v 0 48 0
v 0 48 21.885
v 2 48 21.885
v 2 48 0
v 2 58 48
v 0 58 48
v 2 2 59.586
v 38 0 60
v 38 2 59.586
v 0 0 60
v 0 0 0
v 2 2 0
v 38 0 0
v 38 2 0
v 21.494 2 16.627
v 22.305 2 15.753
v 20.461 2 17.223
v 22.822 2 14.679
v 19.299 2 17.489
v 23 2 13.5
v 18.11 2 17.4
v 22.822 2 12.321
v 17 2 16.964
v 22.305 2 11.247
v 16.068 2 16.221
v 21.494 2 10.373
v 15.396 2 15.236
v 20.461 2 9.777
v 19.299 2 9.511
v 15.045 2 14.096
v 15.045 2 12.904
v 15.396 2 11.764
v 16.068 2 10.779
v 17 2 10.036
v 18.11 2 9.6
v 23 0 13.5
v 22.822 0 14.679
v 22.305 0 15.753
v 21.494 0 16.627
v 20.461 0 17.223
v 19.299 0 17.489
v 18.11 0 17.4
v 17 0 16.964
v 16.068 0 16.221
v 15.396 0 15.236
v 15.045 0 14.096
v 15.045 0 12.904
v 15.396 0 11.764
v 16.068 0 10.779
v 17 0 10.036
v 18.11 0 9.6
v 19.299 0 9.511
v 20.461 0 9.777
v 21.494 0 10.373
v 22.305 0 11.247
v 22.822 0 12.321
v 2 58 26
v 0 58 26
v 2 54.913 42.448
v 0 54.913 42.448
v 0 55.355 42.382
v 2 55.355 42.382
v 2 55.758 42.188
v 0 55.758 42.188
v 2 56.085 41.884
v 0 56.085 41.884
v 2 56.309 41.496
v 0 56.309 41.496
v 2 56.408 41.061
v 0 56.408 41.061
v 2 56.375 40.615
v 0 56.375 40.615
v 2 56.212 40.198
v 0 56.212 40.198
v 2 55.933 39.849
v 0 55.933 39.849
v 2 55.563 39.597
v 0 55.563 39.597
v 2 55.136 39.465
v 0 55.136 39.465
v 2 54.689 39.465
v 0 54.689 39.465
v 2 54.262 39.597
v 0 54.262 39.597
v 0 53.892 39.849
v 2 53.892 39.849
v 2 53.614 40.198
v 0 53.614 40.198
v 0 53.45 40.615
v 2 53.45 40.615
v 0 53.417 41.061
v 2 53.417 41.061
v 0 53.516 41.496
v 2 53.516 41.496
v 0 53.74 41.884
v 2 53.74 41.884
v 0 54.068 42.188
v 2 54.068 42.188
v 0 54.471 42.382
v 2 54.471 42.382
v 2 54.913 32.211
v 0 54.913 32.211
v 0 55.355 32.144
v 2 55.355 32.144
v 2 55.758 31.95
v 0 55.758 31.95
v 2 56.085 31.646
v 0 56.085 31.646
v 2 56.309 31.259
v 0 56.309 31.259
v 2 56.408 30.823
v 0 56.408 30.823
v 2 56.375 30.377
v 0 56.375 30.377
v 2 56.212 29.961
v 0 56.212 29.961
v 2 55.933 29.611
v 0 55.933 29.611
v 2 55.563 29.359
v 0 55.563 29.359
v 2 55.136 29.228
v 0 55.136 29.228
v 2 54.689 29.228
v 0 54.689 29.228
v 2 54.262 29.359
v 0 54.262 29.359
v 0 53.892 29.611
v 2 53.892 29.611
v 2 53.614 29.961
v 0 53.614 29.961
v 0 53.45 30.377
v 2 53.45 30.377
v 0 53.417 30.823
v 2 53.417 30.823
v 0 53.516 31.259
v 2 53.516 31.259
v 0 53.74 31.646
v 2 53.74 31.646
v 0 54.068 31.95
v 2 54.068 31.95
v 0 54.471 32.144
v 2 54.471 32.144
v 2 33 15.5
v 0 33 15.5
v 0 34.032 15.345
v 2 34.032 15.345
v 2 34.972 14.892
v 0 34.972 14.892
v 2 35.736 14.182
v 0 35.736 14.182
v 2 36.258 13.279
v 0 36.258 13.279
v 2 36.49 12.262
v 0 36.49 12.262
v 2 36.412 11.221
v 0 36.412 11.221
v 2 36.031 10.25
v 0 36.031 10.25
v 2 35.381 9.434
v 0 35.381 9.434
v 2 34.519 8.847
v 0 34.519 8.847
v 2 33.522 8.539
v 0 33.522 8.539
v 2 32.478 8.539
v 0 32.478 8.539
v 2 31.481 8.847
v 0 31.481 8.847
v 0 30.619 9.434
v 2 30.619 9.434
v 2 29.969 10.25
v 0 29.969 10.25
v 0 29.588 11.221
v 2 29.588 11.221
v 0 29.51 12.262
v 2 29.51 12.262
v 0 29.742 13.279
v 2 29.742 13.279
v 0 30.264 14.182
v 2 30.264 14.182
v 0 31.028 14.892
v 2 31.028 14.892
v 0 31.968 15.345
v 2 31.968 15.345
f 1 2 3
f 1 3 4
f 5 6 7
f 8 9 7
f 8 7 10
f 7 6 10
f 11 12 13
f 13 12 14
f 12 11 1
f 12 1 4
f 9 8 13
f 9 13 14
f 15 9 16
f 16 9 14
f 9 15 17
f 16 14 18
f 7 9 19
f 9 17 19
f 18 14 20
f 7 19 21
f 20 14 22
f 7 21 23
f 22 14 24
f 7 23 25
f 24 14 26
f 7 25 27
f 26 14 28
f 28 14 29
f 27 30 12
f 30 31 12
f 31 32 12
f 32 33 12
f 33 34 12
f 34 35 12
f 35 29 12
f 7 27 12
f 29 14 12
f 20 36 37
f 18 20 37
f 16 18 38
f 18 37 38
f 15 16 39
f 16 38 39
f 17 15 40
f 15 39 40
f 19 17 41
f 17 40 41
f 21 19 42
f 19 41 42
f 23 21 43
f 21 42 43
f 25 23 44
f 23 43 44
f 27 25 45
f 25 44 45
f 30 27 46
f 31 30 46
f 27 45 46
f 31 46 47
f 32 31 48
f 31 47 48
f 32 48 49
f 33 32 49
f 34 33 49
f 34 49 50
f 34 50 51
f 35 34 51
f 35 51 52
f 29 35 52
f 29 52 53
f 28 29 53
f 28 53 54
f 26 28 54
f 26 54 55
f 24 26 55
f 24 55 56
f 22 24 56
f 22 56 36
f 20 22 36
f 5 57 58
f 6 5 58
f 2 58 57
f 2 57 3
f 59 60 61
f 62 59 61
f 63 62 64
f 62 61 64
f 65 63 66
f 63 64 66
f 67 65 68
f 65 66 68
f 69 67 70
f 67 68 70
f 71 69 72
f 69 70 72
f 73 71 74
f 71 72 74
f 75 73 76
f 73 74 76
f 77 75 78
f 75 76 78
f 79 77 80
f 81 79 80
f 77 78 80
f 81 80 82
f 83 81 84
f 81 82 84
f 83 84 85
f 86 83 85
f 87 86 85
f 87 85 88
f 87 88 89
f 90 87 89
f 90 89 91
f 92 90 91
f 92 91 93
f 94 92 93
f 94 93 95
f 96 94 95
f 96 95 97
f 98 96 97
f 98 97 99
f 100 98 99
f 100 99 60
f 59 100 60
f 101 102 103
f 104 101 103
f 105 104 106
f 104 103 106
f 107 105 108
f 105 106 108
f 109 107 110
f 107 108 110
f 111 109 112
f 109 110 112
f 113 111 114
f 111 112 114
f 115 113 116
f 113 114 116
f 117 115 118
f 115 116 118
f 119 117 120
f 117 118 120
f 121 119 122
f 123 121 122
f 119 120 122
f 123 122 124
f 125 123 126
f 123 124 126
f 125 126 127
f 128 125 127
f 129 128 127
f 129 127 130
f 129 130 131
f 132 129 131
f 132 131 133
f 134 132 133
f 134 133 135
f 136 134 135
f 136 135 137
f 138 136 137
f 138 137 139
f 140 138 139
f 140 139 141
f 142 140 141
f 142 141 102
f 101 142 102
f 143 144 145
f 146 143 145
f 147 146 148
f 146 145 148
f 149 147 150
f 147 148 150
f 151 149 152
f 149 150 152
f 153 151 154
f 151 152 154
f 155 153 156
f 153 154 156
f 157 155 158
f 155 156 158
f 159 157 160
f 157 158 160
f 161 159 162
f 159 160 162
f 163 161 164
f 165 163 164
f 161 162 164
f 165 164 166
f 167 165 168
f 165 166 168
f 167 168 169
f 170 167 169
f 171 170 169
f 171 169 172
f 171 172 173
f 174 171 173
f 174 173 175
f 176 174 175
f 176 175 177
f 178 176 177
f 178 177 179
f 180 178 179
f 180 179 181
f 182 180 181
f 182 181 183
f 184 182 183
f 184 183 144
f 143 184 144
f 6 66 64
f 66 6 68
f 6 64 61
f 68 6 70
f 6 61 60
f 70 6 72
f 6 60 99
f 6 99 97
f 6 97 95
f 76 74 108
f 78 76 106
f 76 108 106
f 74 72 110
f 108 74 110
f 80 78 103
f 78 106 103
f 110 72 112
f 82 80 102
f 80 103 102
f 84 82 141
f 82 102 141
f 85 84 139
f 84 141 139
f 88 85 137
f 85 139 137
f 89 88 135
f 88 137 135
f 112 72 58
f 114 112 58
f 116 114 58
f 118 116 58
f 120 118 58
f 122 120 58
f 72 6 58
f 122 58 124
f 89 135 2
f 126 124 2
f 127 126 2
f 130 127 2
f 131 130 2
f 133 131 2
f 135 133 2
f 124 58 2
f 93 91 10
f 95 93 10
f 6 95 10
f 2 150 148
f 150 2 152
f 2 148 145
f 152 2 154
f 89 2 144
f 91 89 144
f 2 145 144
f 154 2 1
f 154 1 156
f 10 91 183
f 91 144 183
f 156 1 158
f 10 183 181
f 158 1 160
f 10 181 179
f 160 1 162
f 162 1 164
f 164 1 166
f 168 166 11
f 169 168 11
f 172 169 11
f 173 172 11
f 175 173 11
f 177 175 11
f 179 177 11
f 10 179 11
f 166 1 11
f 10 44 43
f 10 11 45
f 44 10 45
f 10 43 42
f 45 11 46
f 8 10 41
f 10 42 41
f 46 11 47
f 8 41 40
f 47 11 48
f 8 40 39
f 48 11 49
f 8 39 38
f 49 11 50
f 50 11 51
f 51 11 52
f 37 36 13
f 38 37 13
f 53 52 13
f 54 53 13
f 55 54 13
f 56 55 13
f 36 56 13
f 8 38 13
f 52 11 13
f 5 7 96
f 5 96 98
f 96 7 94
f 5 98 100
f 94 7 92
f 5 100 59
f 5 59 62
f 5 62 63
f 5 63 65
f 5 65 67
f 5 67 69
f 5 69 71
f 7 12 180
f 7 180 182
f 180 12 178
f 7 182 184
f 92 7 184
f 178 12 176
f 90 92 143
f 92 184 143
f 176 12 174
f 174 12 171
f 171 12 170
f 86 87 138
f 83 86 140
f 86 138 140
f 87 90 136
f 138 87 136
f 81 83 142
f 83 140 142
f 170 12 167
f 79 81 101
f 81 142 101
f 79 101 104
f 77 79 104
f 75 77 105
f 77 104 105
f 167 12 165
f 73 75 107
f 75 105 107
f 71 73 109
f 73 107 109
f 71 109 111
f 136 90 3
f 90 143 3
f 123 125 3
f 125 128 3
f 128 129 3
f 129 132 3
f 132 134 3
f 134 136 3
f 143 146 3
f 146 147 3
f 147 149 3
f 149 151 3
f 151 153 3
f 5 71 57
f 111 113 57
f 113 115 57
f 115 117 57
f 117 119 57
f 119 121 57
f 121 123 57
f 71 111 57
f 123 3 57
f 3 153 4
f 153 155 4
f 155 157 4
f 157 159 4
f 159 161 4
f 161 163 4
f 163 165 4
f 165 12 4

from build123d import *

# Parameters (mm, degrees)
EXTRUDE_1_DEPTH     = 60
SKETCH_2_R          = 1.5
SKETCH_2_R_2        = 3.5
CUT_EXTRUDE_1_DEPTH = 39
SKETCH_3_R          = 4
CUT_EXTRUDE_2_DEPTH = 50


with BuildPart() as part:
    # 草图1 → 凸台-拉伸1 (new body)
    with BuildSketch(Plane.XY):
        Polygon((0, 58), (0, 0), (38, 0), (38, 2), (2, 2), (2, 58), align=None)
    extrude(amount=EXTRUDE_1_DEPTH)

    # 草图2 → 切除-拉伸1 (cut, through all)
    with BuildSketch(Plane.ZY):
        with Locations((30.710851292, 54.912666943)):
            Circle(SKETCH_2_R)
        with Locations((40.948406341, 54.912666943)):
            Circle(SKETCH_2_R)
        with Locations((12, 33)):
            Circle(SKETCH_2_R_2)
        Polygon((60, 0), (60, 58), (48, 58), align=None)
        Polygon((26, 58), (21.884599262, 48), (0, 48), (0, 58), align=None)
    extrude(amount=-CUT_EXTRUDE_1_DEPTH, mode=Mode.SUBTRACT)

    # 草图3 → 切除-拉伸2 (cut)
    with BuildSketch(Plane.XZ):
        with Locations((19, 13.5)):
            Circle(SKETCH_3_R)
    extrude(amount=-CUT_EXTRUDE_2_DEPTH, mode=Mode.SUBTRACT)


solid = part.part
